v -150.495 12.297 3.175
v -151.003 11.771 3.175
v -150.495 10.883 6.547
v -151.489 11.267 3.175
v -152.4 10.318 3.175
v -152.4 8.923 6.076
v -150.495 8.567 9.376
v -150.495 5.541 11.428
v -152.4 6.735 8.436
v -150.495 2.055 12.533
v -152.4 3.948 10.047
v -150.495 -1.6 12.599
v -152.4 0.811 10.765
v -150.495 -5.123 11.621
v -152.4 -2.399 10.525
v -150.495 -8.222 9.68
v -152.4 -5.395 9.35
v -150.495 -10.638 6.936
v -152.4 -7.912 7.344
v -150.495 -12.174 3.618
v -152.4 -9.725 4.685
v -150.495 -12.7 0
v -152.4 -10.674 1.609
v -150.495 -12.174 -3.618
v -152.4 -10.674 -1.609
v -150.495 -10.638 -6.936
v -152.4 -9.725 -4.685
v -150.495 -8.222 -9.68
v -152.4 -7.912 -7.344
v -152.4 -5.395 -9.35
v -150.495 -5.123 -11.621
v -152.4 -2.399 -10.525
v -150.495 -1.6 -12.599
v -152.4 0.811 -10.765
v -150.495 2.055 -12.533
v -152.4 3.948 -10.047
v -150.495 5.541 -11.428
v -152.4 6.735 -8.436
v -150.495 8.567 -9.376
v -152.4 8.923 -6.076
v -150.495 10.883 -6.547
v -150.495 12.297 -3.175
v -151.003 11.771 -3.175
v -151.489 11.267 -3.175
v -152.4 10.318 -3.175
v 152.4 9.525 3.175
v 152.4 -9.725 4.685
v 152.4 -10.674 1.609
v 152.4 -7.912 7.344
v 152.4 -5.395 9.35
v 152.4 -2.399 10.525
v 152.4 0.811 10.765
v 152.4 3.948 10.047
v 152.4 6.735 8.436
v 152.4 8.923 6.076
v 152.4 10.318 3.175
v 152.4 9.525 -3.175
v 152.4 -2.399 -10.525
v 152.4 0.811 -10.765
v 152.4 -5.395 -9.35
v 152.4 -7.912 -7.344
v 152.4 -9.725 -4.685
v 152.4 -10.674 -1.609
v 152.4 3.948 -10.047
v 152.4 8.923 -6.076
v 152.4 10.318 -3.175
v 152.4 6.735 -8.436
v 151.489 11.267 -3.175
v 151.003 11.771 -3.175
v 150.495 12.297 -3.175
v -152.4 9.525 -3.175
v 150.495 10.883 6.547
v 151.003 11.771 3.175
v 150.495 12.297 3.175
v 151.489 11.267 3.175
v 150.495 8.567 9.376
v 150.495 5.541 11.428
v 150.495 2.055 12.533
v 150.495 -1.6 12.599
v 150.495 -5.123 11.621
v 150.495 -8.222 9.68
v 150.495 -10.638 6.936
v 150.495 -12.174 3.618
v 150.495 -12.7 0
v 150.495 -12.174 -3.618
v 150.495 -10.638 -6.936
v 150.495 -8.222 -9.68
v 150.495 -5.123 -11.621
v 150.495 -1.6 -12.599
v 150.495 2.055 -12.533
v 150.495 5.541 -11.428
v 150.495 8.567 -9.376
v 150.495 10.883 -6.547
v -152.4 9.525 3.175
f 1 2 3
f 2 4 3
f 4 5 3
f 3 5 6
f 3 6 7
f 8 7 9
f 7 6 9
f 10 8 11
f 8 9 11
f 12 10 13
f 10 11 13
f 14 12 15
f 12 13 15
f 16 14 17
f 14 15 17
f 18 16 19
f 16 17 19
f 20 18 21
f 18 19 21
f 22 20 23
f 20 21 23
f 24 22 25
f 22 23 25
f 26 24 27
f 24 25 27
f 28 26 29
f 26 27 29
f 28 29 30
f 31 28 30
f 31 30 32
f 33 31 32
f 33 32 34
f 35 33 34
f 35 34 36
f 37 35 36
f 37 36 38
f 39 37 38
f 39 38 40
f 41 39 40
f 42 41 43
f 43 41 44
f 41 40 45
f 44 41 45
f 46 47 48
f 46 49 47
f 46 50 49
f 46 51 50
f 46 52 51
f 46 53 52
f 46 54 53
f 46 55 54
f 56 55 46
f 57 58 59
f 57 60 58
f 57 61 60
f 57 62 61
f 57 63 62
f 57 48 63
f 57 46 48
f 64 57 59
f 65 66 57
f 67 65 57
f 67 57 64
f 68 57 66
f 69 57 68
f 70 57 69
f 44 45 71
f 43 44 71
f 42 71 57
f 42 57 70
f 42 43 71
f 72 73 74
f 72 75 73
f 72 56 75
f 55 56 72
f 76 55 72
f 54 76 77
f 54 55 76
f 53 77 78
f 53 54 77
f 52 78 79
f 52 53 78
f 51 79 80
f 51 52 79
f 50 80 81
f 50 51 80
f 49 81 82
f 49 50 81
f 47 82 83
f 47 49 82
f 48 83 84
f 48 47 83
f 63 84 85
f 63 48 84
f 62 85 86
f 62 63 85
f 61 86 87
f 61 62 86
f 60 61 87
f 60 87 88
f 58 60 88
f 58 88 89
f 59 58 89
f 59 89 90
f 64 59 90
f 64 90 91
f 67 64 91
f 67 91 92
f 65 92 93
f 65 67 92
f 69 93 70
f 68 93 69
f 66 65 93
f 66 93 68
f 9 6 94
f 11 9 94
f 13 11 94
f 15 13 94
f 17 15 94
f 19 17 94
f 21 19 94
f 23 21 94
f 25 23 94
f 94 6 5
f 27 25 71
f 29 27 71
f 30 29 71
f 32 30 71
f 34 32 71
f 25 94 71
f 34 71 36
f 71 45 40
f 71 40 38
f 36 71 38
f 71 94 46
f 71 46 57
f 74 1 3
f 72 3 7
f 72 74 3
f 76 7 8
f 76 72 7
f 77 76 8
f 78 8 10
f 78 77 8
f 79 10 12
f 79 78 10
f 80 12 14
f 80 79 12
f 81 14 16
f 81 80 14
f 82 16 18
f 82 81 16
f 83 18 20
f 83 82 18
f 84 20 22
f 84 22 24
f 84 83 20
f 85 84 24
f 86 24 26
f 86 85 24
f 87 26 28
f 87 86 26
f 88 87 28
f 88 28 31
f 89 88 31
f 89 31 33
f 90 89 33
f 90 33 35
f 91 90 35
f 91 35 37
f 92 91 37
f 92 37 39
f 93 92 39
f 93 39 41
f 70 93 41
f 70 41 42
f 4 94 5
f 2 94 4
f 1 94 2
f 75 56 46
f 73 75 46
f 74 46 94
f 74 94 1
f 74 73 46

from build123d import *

# Parameters (mm, degrees)
SKETCH1_R           = 12.7
EXTRUDE1_DEPTH      = 152.4
CHAMFER1_SIZE       = 1.905
SKETCH3_W           = 6.35
SKETCH3_H           = 3.175
EXTRUDE2_DEPTH      = 153.4
EXTRUDE2_DEPTH_BACK = 153.4


with BuildPart() as part:
    # Sketch1 → Extrude1 (new body, symmetric)
    with BuildSketch(Plane(origin=(0, 0, 0), x_dir=(0, 0, -1), z_dir=(1, 0, 0))):
        Circle(SKETCH1_R)
    extrude(amount=EXTRUDE1_DEPTH, both=True)

    # Chamfer1
    chamfer1_edges = [part.edges().sort_by_distance(p)[0] for p in [
        (-152.4, 0, 12.7),
        (152.4, 0, 12.7),
    ]]
    chamfer(chamfer1_edges, length=CHAMFER1_SIZE)

    # Sketch3 → Extrude2 (cut, two sides)
    with BuildSketch(Plane(origin=(0, 0, 0), x_dir=(0, 0, -1), z_dir=(1, 0, 0))) as extrude2_sk:
        with Locations((0, 11.1125)):
            Rectangle(SKETCH3_W, SKETCH3_H)
    extrude(amount=EXTRUDE2_DEPTH, mode=Mode.SUBTRACT)
    extrude(extrude2_sk.sketch, amount=-EXTRUDE2_DEPTH_BACK, mode=Mode.SUBTRACT)


solid = part.part
